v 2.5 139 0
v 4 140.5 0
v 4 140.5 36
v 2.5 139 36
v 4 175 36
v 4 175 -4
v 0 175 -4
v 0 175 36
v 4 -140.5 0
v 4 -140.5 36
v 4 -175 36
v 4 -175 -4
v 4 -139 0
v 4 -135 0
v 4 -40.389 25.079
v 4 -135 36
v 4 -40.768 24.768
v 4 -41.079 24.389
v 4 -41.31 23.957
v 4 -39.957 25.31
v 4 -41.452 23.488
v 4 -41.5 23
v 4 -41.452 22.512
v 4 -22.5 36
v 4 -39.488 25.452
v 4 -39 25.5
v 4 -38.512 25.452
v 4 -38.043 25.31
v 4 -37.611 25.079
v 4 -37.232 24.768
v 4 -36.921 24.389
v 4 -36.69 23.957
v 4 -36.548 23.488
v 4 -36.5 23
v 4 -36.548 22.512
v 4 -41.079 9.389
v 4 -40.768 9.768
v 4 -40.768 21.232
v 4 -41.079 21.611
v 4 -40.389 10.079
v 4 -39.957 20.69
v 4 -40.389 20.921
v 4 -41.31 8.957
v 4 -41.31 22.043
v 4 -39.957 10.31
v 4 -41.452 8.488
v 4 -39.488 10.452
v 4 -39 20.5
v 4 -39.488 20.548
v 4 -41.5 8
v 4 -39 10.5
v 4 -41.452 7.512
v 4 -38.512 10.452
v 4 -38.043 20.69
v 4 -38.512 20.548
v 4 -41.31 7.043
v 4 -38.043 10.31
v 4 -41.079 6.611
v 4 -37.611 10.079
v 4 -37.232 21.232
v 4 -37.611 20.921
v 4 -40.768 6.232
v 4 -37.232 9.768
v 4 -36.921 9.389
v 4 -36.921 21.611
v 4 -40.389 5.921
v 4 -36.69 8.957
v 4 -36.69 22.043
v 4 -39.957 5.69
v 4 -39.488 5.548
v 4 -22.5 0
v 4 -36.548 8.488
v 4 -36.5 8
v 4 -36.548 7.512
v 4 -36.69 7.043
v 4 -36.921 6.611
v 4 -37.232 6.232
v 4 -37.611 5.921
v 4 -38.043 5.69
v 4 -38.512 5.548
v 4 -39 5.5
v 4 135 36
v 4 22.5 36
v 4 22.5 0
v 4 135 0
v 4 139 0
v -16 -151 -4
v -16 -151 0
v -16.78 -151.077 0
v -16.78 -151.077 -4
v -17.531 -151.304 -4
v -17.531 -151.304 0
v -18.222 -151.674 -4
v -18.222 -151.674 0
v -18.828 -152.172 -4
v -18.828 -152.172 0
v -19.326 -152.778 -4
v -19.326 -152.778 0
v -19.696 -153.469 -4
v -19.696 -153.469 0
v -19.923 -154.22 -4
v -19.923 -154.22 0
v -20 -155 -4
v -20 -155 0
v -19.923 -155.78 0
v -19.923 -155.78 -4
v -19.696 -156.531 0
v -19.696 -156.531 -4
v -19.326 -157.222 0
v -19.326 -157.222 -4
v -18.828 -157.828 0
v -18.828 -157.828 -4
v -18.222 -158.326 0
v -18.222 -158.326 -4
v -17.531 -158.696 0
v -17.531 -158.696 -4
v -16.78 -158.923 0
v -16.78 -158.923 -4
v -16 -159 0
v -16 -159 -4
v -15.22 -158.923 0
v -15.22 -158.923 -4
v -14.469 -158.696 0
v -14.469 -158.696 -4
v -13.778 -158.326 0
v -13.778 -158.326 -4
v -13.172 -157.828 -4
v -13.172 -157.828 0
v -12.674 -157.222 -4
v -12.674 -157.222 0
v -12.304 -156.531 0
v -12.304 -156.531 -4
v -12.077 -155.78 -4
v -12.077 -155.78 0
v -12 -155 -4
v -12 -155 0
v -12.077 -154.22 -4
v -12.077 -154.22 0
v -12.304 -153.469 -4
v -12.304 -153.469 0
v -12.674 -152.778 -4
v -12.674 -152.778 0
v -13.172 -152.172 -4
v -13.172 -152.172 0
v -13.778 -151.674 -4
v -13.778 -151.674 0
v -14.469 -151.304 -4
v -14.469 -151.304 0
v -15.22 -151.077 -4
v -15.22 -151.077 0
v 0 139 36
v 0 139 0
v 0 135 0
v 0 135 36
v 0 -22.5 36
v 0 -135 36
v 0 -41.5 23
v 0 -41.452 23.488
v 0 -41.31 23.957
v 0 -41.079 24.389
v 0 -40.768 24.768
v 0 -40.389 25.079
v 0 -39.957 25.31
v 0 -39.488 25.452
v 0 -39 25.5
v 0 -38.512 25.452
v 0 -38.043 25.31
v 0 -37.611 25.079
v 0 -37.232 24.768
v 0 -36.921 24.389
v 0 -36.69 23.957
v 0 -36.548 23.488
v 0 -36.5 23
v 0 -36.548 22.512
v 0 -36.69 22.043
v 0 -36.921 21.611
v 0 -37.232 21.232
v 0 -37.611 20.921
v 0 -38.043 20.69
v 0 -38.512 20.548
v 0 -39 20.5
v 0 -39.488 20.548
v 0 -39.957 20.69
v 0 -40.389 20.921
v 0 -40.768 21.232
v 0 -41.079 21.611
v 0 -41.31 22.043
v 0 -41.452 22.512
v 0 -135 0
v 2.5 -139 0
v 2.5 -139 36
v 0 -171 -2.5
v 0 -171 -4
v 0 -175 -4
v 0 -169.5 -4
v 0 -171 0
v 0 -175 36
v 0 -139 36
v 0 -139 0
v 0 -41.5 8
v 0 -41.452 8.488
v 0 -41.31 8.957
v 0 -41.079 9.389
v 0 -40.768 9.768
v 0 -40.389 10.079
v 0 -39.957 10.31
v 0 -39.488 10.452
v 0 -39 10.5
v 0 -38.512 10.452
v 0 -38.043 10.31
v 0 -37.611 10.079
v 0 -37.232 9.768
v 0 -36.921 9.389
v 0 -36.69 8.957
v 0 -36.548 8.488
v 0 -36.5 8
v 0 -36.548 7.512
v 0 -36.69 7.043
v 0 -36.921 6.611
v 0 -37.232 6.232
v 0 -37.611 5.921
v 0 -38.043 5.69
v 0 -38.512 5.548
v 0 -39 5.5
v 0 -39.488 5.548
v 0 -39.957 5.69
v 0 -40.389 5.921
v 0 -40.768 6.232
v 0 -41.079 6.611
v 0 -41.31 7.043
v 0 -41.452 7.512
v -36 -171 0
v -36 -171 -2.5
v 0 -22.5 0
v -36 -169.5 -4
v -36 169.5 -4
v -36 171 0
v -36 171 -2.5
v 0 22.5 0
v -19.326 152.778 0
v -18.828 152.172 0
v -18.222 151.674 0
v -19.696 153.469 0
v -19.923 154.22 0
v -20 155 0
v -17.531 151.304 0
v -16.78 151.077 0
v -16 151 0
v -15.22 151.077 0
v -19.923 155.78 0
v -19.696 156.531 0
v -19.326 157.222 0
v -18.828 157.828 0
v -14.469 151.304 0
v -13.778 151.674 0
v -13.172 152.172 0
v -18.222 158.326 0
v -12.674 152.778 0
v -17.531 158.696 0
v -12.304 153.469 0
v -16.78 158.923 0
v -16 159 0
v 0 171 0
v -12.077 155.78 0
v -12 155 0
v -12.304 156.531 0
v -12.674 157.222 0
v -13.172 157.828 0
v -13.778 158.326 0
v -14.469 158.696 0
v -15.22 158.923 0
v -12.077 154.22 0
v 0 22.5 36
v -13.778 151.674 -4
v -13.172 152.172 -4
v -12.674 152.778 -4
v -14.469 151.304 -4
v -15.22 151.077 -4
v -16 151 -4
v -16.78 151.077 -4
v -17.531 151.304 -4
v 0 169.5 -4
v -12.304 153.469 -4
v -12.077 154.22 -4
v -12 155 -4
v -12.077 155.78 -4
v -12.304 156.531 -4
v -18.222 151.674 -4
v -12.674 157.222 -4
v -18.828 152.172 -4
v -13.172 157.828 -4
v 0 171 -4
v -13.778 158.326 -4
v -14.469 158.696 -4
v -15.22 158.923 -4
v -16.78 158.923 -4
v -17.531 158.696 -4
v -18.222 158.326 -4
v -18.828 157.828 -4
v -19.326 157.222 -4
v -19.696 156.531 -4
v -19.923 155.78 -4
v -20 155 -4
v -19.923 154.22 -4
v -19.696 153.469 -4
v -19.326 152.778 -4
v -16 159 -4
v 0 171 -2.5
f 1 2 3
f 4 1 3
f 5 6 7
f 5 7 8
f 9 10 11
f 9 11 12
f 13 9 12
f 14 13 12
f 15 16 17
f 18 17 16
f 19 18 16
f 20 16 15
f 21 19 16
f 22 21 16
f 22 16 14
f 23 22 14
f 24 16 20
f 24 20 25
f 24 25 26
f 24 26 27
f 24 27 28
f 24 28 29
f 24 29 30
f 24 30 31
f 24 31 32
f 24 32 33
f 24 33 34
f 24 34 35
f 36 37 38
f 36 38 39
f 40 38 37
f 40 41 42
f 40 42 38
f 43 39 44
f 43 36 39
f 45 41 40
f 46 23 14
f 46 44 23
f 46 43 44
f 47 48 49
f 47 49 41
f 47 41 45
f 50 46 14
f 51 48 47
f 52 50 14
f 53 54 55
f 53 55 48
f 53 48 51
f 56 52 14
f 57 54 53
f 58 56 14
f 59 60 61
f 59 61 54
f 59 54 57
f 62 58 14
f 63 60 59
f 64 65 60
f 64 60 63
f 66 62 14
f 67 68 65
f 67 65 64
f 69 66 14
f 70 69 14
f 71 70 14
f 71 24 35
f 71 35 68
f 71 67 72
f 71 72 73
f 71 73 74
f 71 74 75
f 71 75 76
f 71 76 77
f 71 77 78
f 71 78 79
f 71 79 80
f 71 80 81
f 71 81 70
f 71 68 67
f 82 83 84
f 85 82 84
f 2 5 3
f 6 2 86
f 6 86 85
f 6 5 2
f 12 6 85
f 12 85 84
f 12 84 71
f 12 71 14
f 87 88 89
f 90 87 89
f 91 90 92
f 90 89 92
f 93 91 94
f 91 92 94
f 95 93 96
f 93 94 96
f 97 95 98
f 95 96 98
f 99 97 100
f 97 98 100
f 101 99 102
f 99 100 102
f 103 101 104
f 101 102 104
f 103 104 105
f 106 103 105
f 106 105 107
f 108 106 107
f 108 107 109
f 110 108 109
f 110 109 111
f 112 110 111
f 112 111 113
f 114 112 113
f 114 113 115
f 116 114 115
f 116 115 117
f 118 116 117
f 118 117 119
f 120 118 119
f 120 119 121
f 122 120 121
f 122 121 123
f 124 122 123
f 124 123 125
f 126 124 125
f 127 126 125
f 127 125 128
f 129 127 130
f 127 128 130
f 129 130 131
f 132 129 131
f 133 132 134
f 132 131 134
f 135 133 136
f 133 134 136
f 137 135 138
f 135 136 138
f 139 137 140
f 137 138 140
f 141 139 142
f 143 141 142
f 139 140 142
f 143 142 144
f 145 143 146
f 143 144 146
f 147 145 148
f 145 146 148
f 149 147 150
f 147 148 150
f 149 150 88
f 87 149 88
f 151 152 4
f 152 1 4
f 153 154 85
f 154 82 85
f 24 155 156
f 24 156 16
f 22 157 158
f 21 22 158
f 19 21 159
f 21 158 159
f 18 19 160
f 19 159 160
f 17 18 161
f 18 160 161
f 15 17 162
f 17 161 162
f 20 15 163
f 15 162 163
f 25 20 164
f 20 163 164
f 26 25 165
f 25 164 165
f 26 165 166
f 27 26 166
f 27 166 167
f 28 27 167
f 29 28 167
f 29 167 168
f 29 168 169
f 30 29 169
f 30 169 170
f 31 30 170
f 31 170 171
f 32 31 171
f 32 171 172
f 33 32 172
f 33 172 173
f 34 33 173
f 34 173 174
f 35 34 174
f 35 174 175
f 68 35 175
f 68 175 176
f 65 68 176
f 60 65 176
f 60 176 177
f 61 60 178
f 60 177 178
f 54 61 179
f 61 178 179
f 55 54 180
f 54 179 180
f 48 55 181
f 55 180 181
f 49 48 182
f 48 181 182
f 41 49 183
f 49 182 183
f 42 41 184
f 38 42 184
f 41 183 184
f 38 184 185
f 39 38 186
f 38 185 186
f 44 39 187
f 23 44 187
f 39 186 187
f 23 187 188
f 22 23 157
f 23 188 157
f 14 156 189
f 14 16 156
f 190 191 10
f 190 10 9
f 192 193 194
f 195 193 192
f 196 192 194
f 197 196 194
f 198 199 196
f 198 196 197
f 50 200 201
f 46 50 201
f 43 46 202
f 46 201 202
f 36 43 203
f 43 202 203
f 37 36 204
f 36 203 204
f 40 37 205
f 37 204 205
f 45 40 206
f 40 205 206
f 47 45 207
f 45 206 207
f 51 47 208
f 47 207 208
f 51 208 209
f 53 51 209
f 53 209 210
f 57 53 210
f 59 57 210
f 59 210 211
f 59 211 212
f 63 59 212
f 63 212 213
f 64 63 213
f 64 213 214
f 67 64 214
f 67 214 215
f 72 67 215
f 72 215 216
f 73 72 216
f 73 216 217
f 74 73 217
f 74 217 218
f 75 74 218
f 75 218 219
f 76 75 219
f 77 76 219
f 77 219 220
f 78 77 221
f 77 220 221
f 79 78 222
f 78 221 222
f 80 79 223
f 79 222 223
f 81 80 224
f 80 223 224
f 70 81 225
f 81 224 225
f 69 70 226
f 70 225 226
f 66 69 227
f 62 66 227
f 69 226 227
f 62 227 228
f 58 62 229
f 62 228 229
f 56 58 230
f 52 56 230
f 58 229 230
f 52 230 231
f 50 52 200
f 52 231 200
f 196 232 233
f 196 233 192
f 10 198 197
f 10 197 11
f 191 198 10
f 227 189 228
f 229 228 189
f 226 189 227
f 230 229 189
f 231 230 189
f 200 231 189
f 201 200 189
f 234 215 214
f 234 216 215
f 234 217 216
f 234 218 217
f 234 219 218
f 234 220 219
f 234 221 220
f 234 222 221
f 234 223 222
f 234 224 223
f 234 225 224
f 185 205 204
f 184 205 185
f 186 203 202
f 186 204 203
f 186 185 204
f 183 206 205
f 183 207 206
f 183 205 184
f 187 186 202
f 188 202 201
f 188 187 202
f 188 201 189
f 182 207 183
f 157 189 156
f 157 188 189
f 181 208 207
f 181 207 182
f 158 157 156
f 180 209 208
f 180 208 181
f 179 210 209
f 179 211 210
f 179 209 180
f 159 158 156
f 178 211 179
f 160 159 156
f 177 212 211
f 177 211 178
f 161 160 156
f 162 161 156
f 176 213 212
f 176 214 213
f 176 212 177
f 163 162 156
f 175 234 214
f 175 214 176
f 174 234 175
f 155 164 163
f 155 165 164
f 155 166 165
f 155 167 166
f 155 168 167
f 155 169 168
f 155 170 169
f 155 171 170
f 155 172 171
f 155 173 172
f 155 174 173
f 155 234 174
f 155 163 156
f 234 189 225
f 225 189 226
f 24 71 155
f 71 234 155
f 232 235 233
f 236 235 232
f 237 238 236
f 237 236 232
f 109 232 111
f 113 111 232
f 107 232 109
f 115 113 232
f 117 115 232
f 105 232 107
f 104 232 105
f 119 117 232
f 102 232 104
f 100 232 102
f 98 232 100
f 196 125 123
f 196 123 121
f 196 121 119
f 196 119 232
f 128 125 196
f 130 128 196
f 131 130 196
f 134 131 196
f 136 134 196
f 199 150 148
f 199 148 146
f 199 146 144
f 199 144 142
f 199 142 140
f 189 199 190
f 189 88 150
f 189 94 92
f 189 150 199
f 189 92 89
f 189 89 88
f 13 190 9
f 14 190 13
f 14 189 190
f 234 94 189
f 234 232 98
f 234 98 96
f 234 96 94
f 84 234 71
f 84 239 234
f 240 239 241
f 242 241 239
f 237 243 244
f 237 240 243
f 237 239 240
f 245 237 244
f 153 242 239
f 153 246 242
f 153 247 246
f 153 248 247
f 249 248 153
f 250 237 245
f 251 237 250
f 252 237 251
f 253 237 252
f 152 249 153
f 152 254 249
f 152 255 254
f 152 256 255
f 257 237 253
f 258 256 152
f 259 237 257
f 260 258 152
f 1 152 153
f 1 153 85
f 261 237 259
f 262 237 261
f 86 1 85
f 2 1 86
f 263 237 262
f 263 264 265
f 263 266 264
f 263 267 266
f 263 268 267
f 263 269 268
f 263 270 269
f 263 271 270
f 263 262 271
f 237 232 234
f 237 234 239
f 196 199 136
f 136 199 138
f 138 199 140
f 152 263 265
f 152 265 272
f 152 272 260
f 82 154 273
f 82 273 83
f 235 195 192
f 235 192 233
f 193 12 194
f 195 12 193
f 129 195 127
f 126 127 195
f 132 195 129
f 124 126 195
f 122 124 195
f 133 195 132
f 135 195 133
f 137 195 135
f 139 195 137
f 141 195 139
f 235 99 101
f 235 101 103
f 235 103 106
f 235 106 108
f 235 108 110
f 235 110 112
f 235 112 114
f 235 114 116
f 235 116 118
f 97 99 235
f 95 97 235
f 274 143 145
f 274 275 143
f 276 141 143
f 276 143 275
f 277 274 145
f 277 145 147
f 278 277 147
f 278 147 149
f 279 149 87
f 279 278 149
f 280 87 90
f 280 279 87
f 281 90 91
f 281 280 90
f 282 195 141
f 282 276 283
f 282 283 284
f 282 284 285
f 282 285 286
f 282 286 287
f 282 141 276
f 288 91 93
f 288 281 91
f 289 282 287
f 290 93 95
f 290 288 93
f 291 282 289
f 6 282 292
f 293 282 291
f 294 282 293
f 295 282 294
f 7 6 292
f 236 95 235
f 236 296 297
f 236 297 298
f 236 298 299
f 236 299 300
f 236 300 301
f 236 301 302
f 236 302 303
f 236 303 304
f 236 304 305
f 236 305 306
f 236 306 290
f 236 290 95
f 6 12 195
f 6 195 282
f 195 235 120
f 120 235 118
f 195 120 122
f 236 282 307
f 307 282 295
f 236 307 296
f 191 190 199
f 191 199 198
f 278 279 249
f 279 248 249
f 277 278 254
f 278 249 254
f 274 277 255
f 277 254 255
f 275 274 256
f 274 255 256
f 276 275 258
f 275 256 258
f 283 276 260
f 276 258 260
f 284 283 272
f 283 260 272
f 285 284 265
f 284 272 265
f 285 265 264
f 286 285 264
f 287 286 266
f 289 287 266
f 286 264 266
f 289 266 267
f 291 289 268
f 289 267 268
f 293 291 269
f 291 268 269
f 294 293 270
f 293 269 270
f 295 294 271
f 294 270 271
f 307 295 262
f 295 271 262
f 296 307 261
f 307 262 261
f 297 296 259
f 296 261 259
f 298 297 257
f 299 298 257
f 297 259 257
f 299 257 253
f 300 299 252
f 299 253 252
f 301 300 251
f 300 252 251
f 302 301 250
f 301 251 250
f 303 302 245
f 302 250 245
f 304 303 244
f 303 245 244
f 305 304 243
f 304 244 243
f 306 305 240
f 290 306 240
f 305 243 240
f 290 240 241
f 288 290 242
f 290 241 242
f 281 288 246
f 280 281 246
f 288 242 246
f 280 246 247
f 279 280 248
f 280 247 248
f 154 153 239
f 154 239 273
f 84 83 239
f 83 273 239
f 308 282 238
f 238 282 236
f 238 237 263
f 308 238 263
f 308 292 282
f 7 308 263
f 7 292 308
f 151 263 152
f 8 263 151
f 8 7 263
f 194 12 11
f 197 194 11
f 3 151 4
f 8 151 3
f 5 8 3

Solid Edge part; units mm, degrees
sketch "Sketch1" plane through (0, 0, 0) normal (0, -1, 0) x (1, 0, 0)
  line L0 (-36, 0) -> (0, 0)
  line L1 (0, 0) -> (0, 36)
  line L2 (0, 36) -> (4, 36)
  line L3 (4, 36) -> (4, -4)
  line L4 (4, -4) -> (-36, -4)
  line L5 (-36, -4) -> (-36, 0)
  dimension "D1" = 36
  dimension "D2" = 4
extrude "Protrusion1" add sketch "Sketch1" along normal mid plane 350
sketch "Sketch2" plane through (-18, 0, 0) normal (0, 0, 1) x (0, -1, 0)
  circle A0 centre (-155, 2) radius 4
  dimension "D1" = 20
  dimension "D2" = 20
  dimension "D3" = 8
extrude "Cutout1" cut sketch "Sketch2" against normal through all
mirror "Mirror1" about plane through (0, 0, 0) normal (0, -1, 0) of "Cutout1"
sketch "Sketch3" plane through (0, 0, 18) normal (-1, 0, 0) x (0, -1, 0)
  line L0 (-22.5, -18) -> (22.5, -18)
  line L1 (22.5, -18) -> (22.5, 18)
  line L2 (22.5, 18) -> (-22.5, 18)
  line L3 (-22.5, 18) -> (-22.5, -18)
  dimension "D1" = 45
extrude "Cutout2" cut sketch "Sketch3" against normal through all
sketch "Sketch4" plane through (0, -97.75, 18) normal (-1, 0, 0) x (0, -1, 0)
  circle A0 centre (-58.75, 5) radius 2.5
  circle A1 centre (-58.75, -10) radius 2.5
  dimension "D1" = 15
  dimension "D2" = 5
  dimension "D3" = 16.5
  dimension "D4" = 8
extrude "Cutout3" cut sketch "Sketch4" against normal through all
sketch "Sketch5" plane through (-16, 0, 0) normal (0, 0, 1) x (0, 1, 0)
  line L0 (175, 20) -> (171, 20)
  line L1 (171, 20) -> (171, -16)
  line L2 (171, -16) -> (175, -16)
  line L3 (175, -16) -> (175, 20)
  dimension "D1" = 4
extrude "Cutout4" cut sketch "Sketch5" against normal up to next
sketch "Sketch6" plane through (4, 0, 16) normal (1, 0, 0) x (0, 1, 0)
  line L0 (139, 20) -> (135, 20)
  line L1 (135, 20) -> (135, -16)
  line L2 (135, -16) -> (139, -16)
  line L3 (139, -16) -> (139, 20)
  dimension "D1" = 4
  dimension "D2" = 40
extrude "Cutout5" cut sketch "Sketch6" against normal up to next
sketch "Sketch7" plane through (-16, -2, 0) normal (0, 0, 1) x (0, 1, 0)
  line L0 (-173, 20) -> (-169, 20)
  line L1 (-169, 20) -> (-169, -16)
  line L2 (-169, -16) -> (-173, -16)
  line L3 (-173, -16) -> (-173, 20)
  dimension "D1" = 4
extrude "Cutout6" cut sketch "Sketch7" against normal up to next
sketch "Sketch8" plane through (4, 0, 16) normal (1, 0, 0) x (0, 1, 0)
  line L0 (-139, 20) -> (-135, 20)
  line L1 (-135, 20) -> (-135, -16)
  line L2 (-135, -16) -> (-139, -16)
  line L3 (-139, -16) -> (-139, 20)
  dimension "D1" = 4
  dimension "D2" = 40
extrude "Cutout7" cut sketch "Sketch8" against normal up to next
chamfer "Fase_3" distance 1.5 angle 45 4 edges at (4, 139, 18) (4, -139, 18) (-18, 171, -4) (-18, -171, -4)
properties material "Aluminium, 7075-T6"
